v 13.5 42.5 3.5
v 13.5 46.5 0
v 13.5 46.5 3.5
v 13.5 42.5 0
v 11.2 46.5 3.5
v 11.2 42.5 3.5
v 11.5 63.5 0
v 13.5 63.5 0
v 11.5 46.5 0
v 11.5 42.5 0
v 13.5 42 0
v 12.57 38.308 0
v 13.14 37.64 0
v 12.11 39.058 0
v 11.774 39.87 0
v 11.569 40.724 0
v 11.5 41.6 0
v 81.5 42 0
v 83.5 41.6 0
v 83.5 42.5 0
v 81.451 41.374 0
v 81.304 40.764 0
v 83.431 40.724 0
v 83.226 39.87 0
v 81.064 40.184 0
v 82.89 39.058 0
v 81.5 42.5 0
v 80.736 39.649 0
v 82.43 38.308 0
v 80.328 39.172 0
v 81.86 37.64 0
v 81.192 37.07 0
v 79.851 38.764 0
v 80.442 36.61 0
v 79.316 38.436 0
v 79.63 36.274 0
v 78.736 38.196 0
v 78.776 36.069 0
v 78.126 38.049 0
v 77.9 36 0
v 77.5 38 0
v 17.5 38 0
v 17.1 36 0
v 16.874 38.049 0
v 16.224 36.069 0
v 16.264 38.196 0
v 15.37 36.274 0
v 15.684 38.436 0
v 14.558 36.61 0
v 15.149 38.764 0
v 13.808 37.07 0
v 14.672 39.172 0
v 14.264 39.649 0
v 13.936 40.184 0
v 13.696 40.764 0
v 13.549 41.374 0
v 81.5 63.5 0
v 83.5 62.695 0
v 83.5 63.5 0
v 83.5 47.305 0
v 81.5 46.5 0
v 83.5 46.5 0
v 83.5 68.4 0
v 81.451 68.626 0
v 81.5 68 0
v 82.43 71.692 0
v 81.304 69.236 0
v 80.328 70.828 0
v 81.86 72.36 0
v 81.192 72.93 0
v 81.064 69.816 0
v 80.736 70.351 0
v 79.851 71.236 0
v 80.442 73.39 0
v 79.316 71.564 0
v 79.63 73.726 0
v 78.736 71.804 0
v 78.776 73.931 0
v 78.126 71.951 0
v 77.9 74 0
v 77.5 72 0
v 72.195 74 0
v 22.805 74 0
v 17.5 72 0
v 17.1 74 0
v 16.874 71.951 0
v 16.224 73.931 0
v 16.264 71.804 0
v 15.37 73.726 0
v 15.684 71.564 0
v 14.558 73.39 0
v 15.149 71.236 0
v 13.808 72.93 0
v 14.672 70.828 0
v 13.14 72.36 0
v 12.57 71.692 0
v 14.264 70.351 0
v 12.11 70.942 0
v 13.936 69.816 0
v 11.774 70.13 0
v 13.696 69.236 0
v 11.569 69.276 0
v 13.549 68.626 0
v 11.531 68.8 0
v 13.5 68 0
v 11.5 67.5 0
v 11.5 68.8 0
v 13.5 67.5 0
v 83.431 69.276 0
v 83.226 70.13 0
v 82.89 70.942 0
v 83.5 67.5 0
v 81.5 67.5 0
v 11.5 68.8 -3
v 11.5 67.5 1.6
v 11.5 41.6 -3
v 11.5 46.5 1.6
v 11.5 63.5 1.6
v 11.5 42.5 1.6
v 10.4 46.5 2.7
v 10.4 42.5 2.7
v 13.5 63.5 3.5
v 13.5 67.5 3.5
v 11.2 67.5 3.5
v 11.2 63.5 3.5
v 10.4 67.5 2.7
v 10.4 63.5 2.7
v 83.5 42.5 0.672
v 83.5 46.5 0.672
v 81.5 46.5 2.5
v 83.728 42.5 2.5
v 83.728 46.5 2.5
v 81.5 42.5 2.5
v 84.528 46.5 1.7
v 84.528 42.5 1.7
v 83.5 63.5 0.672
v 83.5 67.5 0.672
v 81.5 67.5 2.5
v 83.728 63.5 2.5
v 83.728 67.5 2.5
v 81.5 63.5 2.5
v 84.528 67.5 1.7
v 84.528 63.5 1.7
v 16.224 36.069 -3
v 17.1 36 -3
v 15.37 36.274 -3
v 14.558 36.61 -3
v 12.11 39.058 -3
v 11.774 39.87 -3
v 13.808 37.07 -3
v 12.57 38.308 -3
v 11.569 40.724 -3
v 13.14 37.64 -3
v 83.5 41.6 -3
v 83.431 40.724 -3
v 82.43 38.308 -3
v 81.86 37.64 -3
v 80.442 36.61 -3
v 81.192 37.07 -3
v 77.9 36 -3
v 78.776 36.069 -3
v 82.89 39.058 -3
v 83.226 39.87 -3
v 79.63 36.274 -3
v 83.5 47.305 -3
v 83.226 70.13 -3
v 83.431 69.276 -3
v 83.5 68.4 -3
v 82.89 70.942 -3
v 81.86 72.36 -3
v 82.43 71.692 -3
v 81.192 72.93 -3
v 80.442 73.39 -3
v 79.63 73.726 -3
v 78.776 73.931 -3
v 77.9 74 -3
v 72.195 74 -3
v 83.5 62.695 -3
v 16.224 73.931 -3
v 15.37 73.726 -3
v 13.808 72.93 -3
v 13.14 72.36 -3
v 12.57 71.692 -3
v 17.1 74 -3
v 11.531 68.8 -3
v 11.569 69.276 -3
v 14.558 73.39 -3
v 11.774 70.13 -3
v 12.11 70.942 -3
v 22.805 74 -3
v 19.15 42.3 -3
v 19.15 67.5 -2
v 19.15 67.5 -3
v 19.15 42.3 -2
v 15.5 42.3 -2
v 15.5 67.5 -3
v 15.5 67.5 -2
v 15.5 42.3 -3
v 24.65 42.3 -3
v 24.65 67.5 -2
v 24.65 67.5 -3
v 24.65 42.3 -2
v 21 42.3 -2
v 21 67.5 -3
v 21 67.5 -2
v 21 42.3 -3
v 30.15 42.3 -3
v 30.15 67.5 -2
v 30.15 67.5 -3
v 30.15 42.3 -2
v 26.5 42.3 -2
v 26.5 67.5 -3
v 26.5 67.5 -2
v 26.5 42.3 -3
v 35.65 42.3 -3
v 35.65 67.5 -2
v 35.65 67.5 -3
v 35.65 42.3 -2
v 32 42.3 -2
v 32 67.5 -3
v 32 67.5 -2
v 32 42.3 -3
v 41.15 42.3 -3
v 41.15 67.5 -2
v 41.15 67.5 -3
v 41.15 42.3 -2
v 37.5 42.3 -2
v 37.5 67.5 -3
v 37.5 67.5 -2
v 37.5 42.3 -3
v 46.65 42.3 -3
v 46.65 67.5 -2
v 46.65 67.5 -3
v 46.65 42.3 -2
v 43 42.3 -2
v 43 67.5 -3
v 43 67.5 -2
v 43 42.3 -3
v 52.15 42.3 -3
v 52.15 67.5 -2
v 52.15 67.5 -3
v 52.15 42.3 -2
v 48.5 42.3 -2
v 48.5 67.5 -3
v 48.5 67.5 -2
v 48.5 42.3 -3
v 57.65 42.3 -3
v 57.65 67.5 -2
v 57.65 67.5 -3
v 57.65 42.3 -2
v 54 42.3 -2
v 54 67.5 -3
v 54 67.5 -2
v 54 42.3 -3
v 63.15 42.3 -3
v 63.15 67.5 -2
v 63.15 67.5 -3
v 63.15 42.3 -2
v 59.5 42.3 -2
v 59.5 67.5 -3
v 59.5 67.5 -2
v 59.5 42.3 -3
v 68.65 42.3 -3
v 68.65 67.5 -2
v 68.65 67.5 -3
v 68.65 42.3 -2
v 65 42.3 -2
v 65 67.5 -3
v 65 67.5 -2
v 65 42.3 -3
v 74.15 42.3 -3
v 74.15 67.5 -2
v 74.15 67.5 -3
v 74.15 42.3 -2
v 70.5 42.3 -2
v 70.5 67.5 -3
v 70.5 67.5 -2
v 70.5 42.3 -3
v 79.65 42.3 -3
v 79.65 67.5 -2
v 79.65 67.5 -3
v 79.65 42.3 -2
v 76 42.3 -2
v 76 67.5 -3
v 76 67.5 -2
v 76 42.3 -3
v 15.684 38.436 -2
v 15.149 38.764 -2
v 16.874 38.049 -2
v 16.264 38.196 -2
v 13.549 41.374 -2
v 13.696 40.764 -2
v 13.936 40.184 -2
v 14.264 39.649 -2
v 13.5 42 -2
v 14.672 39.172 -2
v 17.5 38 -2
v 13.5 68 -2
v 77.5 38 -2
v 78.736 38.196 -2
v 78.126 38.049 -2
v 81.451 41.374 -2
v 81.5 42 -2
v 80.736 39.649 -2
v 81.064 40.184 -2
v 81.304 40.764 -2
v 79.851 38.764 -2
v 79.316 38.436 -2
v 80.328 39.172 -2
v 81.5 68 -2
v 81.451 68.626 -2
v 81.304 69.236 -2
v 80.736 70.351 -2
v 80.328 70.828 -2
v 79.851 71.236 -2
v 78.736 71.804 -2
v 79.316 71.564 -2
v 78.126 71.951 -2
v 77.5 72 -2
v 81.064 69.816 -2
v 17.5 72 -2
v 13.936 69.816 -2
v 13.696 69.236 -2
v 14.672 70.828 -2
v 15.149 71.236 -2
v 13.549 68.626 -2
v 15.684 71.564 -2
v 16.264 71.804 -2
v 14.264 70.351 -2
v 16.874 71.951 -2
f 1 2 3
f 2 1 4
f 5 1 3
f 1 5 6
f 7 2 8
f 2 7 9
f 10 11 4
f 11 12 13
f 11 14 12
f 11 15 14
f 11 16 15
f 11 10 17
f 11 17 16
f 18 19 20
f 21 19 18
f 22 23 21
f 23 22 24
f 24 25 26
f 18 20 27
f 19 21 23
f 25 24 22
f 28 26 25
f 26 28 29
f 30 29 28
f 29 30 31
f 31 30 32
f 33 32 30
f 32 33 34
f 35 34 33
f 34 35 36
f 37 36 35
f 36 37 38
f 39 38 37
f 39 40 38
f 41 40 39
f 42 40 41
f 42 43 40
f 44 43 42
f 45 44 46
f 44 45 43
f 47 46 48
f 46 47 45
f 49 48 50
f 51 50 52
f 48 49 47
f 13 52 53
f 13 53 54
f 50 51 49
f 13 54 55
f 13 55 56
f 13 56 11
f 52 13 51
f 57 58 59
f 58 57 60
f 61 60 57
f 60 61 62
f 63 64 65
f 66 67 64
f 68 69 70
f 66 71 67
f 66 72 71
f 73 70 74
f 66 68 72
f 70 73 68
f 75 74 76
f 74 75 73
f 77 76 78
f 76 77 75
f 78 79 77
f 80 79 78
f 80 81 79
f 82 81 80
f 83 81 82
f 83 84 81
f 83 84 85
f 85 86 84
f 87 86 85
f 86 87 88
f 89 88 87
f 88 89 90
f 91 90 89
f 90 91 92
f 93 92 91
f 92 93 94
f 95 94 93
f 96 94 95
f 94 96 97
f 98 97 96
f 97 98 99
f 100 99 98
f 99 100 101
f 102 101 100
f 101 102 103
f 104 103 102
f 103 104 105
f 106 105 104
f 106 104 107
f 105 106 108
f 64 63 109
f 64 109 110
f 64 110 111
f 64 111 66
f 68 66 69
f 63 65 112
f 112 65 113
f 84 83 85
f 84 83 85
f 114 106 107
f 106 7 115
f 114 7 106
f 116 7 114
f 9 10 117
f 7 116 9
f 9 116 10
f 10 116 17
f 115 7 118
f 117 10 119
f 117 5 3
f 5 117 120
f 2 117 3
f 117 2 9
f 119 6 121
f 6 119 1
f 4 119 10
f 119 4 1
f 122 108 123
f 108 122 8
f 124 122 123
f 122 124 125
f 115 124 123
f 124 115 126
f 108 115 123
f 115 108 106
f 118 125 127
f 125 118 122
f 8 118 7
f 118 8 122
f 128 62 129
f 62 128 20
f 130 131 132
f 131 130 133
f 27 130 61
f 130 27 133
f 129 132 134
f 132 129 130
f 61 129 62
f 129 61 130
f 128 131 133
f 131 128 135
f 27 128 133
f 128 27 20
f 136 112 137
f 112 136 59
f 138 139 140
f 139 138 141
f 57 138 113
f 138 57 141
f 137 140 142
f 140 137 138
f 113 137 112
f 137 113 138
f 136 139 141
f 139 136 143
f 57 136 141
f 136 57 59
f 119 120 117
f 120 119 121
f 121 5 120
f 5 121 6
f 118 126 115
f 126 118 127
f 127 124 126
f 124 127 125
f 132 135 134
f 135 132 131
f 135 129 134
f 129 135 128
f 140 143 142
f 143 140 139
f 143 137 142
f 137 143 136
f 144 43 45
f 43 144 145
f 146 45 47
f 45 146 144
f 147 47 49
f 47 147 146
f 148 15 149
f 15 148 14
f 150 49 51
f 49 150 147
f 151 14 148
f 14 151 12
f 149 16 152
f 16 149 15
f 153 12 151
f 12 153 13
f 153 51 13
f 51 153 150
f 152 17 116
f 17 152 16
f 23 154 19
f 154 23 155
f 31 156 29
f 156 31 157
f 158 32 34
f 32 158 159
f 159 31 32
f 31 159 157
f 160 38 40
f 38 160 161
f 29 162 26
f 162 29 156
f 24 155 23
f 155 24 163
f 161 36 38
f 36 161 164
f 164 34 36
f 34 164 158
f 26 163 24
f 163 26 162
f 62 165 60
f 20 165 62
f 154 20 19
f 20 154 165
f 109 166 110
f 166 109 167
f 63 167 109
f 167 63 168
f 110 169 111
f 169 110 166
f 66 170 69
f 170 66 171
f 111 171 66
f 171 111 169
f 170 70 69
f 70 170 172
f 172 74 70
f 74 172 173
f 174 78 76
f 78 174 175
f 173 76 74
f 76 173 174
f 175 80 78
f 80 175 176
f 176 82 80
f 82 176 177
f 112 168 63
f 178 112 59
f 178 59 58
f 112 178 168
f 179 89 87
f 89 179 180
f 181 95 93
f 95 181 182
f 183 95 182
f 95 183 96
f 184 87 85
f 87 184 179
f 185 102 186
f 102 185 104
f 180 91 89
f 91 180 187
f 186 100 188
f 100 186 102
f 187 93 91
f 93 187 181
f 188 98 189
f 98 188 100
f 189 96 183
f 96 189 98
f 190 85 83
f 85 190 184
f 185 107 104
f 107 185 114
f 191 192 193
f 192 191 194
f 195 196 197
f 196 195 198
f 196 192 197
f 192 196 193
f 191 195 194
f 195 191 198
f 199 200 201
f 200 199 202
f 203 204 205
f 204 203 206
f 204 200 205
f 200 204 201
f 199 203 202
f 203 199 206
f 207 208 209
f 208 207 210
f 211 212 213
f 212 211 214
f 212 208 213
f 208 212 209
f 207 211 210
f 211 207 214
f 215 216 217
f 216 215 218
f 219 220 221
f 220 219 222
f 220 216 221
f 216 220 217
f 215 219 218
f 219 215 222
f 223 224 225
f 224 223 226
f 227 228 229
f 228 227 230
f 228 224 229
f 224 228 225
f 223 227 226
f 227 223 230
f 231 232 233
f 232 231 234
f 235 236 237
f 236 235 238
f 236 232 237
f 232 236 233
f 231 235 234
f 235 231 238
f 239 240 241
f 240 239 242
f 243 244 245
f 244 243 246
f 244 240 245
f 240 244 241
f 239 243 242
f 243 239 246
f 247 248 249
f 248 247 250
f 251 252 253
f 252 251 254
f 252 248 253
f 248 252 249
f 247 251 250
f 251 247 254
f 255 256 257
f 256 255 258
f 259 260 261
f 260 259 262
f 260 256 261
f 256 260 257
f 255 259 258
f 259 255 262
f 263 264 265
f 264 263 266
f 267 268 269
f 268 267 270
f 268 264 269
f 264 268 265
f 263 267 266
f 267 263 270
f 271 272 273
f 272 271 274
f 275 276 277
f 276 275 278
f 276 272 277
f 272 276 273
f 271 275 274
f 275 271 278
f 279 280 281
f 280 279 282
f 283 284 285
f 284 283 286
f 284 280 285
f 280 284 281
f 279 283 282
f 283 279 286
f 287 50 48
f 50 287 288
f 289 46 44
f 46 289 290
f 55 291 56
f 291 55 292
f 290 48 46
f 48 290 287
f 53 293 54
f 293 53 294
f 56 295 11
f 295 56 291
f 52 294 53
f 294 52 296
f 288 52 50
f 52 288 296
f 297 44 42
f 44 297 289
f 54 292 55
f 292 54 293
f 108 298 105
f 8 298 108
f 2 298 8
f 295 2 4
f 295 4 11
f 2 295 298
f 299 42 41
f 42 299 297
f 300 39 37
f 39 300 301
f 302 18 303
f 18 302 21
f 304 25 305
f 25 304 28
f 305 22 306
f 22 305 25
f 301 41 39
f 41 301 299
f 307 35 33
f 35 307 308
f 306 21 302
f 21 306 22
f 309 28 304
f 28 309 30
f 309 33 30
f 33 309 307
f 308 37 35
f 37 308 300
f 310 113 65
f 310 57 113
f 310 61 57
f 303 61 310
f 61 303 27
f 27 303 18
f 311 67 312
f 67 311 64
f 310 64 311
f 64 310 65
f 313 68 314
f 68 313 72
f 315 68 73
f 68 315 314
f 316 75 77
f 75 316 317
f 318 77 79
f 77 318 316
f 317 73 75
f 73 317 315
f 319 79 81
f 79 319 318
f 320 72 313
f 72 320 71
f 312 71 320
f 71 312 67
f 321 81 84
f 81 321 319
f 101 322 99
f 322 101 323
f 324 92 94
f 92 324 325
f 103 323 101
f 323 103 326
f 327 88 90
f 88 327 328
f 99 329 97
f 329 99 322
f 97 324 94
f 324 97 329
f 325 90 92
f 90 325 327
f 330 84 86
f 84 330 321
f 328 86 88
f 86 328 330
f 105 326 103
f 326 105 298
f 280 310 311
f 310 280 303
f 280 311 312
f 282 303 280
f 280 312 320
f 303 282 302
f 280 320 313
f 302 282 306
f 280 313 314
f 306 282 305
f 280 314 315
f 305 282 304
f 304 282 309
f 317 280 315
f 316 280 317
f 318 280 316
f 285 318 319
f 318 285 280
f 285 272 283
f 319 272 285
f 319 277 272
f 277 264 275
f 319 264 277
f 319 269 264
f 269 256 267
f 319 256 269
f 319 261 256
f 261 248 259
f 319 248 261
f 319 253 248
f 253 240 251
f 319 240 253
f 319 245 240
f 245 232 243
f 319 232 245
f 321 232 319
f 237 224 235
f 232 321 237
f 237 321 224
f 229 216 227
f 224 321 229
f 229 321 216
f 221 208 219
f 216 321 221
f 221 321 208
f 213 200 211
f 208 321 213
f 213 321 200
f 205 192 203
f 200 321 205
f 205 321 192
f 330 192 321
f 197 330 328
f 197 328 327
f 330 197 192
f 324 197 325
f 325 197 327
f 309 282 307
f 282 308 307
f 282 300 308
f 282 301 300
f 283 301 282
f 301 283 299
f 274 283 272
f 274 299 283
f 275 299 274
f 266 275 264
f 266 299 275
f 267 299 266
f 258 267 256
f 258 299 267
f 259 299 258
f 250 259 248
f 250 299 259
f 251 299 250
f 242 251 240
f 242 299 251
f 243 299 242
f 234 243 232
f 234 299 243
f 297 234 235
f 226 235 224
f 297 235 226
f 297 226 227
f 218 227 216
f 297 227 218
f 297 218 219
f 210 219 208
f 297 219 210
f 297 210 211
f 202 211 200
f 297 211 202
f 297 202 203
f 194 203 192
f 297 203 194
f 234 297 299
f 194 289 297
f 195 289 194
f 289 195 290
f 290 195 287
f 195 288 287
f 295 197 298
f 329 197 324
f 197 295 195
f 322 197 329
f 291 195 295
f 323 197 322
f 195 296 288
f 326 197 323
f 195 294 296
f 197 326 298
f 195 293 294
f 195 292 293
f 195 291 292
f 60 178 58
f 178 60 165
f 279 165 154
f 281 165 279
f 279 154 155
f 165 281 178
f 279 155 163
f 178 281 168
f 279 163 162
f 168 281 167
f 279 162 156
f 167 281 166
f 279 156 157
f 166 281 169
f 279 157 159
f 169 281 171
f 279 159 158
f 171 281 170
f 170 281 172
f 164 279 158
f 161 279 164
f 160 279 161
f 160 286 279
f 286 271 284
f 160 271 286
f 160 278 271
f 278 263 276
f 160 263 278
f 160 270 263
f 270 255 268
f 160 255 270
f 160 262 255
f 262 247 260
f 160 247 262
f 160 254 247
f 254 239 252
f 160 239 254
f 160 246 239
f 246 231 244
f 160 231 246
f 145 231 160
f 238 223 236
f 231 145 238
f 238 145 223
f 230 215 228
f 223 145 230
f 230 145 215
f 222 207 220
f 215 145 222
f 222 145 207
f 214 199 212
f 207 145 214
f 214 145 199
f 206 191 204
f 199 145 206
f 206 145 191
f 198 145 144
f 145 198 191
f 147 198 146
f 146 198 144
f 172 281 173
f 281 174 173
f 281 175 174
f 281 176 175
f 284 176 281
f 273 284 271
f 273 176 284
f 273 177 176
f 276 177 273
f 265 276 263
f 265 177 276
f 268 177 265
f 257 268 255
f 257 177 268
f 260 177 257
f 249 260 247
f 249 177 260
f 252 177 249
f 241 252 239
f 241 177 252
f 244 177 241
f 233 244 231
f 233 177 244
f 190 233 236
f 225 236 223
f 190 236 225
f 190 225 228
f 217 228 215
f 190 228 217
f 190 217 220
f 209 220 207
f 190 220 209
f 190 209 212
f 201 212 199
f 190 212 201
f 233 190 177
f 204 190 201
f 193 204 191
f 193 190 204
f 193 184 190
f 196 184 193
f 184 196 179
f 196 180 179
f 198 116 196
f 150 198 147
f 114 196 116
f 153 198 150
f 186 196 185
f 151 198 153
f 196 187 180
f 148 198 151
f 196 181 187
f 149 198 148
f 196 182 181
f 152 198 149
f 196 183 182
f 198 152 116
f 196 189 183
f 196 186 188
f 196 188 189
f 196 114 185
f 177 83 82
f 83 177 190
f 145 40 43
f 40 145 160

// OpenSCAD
// PRUSA iteration4
// RaspberryPi Cover
// GNU GPL v3
// Josef Průša <iam@josefprusa.cz> and contributors
// http://www.reprap.org/wiki/Prusa_Mendel
// http://prusamendel.org

module raspberry_cover(){
    // Holders
    difference(){
        union(){
            translate([11.5,42.5,0]) cube([2,4,3.5]);
            translate([11.5,63.5,0]) cube([2,4,3.5]);
            translate([81.5,42.5,0]) cube([2,4,2.5]);
            translate([81.5,63.5,0]) cube([2,4,2.5]);

            translate([10.4,42.5,2.7]) rotate([0,45,0]) cube([2,4,2]);
            translate([10.4,63.5,2.7]) rotate([0,45,0]) cube([2,4,2]);
            translate([81.7,42.5,1.7]) rotate([0,45,0]) cube([2,4,2]);
            translate([81.7,63.5,1.7]) rotate([0,45,0]) cube([2,4,2]);
        }
        translate([10.5,42,3.5]) cube([4,5,3.5]);
        translate([10.5,63,3.5]) cube([4,5,3.5]);
        translate([81.5,42,2.5]) cube([4,5,2.5]);
        translate([81.5,63,2.5]) cube([4,5,2.5]);
    }

    // Body
    difference(){
        translate([11.5,36,-3]) cube([72,38,3]);

        translate([-0.4,-0.4,0]) difference(){
            translate([17.5,42,-4.1]) cylinder(h=4.2,r=8,$fn=40);
            translate([17.5,42,-4]) cylinder(h=4,r=5.6,$fn=40);

            translate([11.9,42,-4]) cube([14,8,4]);
            translate([17.5,36.4,-4]) cube([8,6,4]);
        }
        translate([60.4,-0.4,0]) difference(){
            translate([17.5,42,-4.1]) cylinder(h=4.2,r=8,$fn=40);
            translate([17.5,42,-4]) cylinder(h=4,r=5.6,$fn=40);

            translate([9.1,42,-4]) cube([14,8,4]);
            translate([9.5,36.4,-4]) cube([8,6,4]);
        }
        translate([60.4,26.4,0]) difference(){
            translate([17.5,42,-4.1]) cylinder(h=4.2,r=8,$fn=40);
            translate([17.5,42,-4]) cylinder(h=4,r=5.6,$fn=40);

            translate([8.5,33.6,-4]) cube([9,14,4]);
            translate([17.1,34,-4]) cube([6,8,4]);
        }

        translate([-0.4,26.4,0]) difference(){
            translate([17.5,42,-4.1]) cylinder(h=4.2,r=8,$fn=40);
            translate([17.5,42,-4]) cylinder(h=4,r=5.6,$fn=40);

            translate([17.5,33.6,-4]) cube([9,14,4]);
            translate([11.9,33.4,-4]) cube([6,9,4]);
        }

        // Ventilation cutout
        for (i=[-5:6]){
            translate([43+(i*5.5),42.3,-5]) cube([3.65,25.2,10]);
        }

        // Raspberry pcb cutout
        translate ([0,0,-2]) difference(){
            translate([13.5,38,0]) cube([68,34,9]);

            translate([0,0,0]) difference(){
                translate([17.5,42,-1.1]) cylinder(h=9.2,r=8,$fn=40);
                translate([17.5,42,-1]) cylinder(h=9,r=4,$fn=40);

                translate([13.5,42,-1]) cube([12,8,9]);
                translate([17.5,38,-1]) cube([8,5,9]);
            }
            translate([60,0,0]) difference(){
                translate([17.5,42,-1.1]) cylinder(h=9.2,r=8,$fn=40);
                translate([17.5,42,-1]) cylinder(h=9,r=4,$fn=40);

                translate([9.5,42,-1]) cube([12,8,9]);
                translate([9.5,38,-1]) cube([8,5,9]);

            }
            translate([60,26,0]) difference(){
                translate([17.5,42,-1.1]) cylinder(h=9.2,r=8,$fn=40);
                translate([17.5,42,-1]) cylinder(h=9,r=4,$fn=40);

                translate([9.5,34,-1]) cube([8,12,9]);
                translate([17.5,34,-1]) cube([4,8,9]);
            }

            translate([0,26,0]) difference(){
                translate([17.5,42,-1.1]) cylinder(h=9.2,r=8,$fn=40);
                translate([17.5,42,-1]) cylinder(h=9,r=4,$fn=40);

                translate([17.5,34,-1]) cube([8,12,9]);
                translate([13.5,34,-1]) cube([5,8,9]);
            }
        }
    }
}

raspberry_cover();
